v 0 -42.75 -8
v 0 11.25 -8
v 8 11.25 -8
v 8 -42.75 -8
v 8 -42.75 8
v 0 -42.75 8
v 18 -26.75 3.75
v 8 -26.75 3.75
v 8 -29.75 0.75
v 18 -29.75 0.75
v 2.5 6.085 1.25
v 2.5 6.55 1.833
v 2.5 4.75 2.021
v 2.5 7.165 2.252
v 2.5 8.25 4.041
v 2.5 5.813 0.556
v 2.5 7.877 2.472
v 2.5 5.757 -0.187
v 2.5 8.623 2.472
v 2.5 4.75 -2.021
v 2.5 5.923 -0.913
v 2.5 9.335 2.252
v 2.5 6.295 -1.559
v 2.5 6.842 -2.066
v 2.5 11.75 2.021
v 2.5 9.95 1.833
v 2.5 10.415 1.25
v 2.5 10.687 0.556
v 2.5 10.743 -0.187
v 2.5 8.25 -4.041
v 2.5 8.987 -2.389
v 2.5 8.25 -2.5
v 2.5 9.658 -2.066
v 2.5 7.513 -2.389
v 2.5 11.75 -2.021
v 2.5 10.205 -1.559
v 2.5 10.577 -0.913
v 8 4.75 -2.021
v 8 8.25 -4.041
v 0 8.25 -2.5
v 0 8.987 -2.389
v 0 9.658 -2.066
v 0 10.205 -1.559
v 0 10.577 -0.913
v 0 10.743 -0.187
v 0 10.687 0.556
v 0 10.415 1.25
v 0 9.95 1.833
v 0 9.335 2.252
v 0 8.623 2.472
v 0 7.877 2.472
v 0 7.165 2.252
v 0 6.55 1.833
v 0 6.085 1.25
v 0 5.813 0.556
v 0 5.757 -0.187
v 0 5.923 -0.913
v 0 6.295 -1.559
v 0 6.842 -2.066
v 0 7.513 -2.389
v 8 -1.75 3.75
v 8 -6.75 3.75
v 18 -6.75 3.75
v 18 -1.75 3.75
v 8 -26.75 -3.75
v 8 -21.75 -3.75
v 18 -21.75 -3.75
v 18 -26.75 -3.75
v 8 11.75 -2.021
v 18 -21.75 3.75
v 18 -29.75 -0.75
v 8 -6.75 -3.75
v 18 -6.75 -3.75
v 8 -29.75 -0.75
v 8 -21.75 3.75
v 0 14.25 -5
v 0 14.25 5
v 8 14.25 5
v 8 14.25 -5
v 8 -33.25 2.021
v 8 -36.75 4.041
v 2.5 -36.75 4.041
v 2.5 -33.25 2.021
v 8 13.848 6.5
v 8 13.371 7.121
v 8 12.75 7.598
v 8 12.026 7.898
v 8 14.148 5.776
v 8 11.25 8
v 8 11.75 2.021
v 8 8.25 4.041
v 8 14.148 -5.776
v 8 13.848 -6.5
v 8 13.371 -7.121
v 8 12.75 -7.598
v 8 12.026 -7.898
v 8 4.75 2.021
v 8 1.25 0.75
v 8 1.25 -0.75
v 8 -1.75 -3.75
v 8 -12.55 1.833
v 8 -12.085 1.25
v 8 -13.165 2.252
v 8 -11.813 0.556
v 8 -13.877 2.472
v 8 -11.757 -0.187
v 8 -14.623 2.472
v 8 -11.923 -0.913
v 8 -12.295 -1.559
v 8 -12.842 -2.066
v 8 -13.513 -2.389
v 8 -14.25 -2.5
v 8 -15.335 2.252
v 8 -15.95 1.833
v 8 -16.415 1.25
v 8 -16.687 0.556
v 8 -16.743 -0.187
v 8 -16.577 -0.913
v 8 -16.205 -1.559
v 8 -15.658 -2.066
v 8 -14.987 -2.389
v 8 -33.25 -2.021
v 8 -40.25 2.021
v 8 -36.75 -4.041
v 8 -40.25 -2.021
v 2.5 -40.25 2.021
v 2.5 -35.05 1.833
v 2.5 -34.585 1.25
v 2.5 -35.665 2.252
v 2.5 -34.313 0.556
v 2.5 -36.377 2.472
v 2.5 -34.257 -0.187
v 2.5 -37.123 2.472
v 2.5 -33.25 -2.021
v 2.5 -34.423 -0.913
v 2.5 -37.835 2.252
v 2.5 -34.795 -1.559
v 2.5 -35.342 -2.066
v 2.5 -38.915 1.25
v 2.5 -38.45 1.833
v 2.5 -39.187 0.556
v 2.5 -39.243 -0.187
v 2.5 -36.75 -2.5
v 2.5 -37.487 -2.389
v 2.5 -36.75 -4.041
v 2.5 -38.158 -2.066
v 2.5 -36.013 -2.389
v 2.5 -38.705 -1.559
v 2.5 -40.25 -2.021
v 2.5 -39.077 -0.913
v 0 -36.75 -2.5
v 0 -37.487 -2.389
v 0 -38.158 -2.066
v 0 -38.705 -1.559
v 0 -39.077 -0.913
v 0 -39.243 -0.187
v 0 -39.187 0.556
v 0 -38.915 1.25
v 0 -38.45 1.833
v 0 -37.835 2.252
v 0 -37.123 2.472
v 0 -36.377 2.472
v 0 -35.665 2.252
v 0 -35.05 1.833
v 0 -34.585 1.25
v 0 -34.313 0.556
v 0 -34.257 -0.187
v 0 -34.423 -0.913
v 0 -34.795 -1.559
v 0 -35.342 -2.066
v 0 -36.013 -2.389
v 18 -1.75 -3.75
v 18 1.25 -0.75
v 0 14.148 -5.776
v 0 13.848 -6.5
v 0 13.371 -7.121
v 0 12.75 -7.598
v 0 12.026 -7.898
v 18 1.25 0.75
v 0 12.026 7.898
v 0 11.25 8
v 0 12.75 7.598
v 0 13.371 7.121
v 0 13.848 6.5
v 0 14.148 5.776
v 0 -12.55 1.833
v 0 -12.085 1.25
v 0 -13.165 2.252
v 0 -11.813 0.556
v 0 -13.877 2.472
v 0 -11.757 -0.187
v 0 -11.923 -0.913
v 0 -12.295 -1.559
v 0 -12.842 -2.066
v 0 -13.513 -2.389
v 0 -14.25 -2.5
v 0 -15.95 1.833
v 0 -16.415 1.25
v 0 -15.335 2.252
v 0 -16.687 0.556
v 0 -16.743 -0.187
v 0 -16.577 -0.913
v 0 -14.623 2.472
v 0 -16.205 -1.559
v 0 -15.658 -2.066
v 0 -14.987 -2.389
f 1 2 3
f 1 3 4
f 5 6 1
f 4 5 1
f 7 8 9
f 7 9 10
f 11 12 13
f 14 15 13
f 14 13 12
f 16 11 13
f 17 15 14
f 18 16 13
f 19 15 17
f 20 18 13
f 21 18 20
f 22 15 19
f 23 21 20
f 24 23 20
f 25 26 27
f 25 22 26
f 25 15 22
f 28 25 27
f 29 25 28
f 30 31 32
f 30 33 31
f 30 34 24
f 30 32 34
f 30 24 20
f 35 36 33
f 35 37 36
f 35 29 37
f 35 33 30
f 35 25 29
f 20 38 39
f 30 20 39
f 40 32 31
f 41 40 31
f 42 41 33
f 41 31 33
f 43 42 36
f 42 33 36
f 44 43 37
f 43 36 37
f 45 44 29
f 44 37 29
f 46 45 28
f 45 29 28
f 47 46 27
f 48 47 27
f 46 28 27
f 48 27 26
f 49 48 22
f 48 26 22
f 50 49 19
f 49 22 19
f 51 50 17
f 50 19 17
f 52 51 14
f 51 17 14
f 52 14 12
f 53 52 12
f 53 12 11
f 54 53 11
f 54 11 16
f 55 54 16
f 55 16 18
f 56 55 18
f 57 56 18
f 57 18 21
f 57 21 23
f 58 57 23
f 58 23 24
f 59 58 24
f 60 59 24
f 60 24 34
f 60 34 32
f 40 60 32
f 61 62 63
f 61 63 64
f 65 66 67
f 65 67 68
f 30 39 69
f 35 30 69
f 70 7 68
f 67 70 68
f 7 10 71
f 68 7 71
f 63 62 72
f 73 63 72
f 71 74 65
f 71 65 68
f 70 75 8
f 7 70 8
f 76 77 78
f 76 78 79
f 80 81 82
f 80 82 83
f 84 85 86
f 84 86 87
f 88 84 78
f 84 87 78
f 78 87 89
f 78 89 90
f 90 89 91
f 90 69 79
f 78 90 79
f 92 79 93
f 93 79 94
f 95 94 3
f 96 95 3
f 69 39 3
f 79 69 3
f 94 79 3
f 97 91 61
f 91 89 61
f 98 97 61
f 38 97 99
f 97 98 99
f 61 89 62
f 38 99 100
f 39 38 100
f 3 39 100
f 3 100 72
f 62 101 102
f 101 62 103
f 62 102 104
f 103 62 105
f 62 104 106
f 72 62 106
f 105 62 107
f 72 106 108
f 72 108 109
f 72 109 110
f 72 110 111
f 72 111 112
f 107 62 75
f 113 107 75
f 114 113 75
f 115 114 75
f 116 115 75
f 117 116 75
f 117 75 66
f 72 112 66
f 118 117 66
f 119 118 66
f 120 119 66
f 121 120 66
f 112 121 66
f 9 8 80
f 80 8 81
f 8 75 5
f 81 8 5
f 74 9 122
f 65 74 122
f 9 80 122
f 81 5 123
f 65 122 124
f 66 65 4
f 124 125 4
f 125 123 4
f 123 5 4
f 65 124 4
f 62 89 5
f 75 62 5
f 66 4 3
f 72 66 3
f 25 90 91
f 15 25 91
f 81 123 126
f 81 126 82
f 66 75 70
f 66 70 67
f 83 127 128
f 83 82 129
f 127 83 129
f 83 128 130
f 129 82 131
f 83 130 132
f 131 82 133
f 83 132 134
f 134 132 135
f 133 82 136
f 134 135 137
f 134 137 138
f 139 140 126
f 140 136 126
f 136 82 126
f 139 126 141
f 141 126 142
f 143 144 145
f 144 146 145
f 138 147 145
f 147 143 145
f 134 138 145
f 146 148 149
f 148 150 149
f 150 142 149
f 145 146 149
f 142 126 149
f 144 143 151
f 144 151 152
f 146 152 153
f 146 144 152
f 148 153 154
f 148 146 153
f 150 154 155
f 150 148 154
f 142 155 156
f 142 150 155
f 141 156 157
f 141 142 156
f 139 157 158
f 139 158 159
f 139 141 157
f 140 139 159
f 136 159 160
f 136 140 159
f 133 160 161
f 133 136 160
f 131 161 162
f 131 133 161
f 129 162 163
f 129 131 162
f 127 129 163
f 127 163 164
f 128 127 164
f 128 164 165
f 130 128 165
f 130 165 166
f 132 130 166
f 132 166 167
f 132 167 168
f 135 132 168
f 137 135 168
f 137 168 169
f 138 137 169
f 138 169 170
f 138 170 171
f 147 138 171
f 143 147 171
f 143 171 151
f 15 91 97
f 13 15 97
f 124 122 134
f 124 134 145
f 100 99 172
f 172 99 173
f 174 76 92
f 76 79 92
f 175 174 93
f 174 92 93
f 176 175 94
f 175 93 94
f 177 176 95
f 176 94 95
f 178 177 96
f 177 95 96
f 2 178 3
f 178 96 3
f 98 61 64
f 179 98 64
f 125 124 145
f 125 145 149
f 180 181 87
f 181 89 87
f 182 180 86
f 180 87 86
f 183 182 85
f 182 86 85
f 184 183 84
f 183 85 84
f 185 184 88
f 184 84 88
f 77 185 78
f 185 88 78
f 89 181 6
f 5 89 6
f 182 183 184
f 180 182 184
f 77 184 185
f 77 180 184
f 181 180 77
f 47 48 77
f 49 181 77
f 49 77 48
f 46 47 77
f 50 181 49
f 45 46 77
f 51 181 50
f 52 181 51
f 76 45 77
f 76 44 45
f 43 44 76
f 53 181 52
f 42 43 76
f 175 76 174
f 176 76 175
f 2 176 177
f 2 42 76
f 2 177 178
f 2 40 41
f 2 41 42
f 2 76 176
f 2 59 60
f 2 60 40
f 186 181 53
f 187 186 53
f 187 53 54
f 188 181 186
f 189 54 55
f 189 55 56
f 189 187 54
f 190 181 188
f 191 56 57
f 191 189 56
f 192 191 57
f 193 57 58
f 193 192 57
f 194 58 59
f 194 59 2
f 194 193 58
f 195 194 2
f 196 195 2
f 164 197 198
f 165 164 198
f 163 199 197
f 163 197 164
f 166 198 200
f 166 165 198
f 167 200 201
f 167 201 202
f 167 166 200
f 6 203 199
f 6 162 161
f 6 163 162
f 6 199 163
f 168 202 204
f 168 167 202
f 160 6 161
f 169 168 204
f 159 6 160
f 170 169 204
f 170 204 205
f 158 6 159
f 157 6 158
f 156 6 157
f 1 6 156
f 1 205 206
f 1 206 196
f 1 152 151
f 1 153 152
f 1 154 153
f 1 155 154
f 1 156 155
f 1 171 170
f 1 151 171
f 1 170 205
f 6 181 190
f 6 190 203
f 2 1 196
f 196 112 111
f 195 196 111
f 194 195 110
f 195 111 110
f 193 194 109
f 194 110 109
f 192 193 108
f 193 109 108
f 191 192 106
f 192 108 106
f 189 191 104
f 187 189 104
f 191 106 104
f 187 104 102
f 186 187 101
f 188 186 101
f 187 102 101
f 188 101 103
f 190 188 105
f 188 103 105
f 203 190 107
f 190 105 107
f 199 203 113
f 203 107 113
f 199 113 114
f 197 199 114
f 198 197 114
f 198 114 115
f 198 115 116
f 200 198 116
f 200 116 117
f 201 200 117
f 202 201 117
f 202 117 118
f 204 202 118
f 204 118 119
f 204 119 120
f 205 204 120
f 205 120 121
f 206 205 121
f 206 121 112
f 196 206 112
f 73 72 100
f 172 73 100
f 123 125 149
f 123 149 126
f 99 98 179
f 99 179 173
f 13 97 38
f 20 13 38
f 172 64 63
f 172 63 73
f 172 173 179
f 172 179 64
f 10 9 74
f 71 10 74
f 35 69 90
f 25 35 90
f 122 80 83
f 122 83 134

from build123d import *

# Parameters (mm, degrees)
ESQUISSE1_W             = 16
ESQUISSE1_H             = 28.5
BOSS_EXTRU_1_DEPTH      = 8
ENL_V_MAT_EXTRU_1_DEPTH = 5.5
ESQUISSE3_R             = 2.5
ENL_V_MAT_EXTRU_2_DEPTH = 3.5
ESQUISSE4_W             = 7.5
ESQUISSE4_H             = 8
BOSS_EXTRU_2_DEPTH      = 10
CHANFREIN2_SIZE         = 3
ESQUISSE5_R             = 2.5
ENL_V_MAT_EXTRU_3_DEPTH = 9
CONG_1_R                = 3


with BuildPart() as part:
    # Esquisse1 → Boss.-Extru.1 (new body)
    with BuildSketch(Plane(origin=(0, 0, 0), x_dir=(0, 0, -1), z_dir=(1, 0, 0))):
        Rectangle(ESQUISSE1_W, ESQUISSE1_H)
    extrude(amount=BOSS_EXTRU_1_DEPTH)

    # Esquisse2 → Enlèv. mat.-Extru.1 (cut)
    with BuildSketch(Plane(origin=(8, 0, 0), x_dir=(0, 0, -1), z_dir=(1, 0, 0))):
        Polygon((4.041451884, 8.25), (2.020725942, 11.75), (-2.020725942, 11.75), (-4.041451884, 8.25), (-2.020725942, 4.75), (2.020725942, 4.75), align=None)
    extrude(amount=-ENL_V_MAT_EXTRU_1_DEPTH, mode=Mode.SUBTRACT)

    # Esquisse3 → Enlèv. mat.-Extru.2 (cut, through all)
    with BuildSketch(Plane(origin=(2.5, 0, 0), x_dir=(0, 0, -1), z_dir=(1, 0, 0))):
        with Locations((0, 8.25)):
            Circle(ESQUISSE3_R)
    extrude(amount=-ENL_V_MAT_EXTRU_2_DEPTH, mode=Mode.SUBTRACT)

    # Esquisse4 → Boss.-Extru.2 (add)
    with BuildSketch(Plane(origin=(8, 0, 0), x_dir=(0, 0, -1), z_dir=(1, 0, 0))):
        with Locations((0, -2.75)):
            Rectangle(ESQUISSE4_W, ESQUISSE4_H)
    extrude(amount=BOSS_EXTRU_2_DEPTH)

    # Chanfrein2
    chanfrein2_edges = [part.edges().sort_by_distance(p)[0] for p in [
        (13, 1.25, -3.75),
        (13, 1.25, 3.75),
    ]]
    chamfer(chanfrein2_edges, length=CHANFREIN2_SIZE)

    # Symétrie1: part across plane


with BuildPart() as part_1:
    add(part.part)
    add(part.part.mirror(Plane(origin=(8, -14.25, 8), x_dir=(0, 0, 1), z_dir=(0, 1, 0))))

    # Esquisse5 → Enlèv. mat.-Extru.3 (cut, through all)
    with BuildSketch(Plane(origin=(8, 0, 0), x_dir=(0, 0, -1), z_dir=(1, 0, 0))):
        with Locations((0, -14.25)):
            Circle(ESQUISSE5_R)
    extrude(amount=-ENL_V_MAT_EXTRU_3_DEPTH, mode=Mode.SUBTRACT)

    # Congé1
    cong_1_edges = [part_1.edges().sort_by_distance(p)[0] for p in [
        (4, 14.25, 8),
        (4, 14.25, -8),
    ]]
    fillet(cong_1_edges, radius=CONG_1_R)


solid = part_1.part
